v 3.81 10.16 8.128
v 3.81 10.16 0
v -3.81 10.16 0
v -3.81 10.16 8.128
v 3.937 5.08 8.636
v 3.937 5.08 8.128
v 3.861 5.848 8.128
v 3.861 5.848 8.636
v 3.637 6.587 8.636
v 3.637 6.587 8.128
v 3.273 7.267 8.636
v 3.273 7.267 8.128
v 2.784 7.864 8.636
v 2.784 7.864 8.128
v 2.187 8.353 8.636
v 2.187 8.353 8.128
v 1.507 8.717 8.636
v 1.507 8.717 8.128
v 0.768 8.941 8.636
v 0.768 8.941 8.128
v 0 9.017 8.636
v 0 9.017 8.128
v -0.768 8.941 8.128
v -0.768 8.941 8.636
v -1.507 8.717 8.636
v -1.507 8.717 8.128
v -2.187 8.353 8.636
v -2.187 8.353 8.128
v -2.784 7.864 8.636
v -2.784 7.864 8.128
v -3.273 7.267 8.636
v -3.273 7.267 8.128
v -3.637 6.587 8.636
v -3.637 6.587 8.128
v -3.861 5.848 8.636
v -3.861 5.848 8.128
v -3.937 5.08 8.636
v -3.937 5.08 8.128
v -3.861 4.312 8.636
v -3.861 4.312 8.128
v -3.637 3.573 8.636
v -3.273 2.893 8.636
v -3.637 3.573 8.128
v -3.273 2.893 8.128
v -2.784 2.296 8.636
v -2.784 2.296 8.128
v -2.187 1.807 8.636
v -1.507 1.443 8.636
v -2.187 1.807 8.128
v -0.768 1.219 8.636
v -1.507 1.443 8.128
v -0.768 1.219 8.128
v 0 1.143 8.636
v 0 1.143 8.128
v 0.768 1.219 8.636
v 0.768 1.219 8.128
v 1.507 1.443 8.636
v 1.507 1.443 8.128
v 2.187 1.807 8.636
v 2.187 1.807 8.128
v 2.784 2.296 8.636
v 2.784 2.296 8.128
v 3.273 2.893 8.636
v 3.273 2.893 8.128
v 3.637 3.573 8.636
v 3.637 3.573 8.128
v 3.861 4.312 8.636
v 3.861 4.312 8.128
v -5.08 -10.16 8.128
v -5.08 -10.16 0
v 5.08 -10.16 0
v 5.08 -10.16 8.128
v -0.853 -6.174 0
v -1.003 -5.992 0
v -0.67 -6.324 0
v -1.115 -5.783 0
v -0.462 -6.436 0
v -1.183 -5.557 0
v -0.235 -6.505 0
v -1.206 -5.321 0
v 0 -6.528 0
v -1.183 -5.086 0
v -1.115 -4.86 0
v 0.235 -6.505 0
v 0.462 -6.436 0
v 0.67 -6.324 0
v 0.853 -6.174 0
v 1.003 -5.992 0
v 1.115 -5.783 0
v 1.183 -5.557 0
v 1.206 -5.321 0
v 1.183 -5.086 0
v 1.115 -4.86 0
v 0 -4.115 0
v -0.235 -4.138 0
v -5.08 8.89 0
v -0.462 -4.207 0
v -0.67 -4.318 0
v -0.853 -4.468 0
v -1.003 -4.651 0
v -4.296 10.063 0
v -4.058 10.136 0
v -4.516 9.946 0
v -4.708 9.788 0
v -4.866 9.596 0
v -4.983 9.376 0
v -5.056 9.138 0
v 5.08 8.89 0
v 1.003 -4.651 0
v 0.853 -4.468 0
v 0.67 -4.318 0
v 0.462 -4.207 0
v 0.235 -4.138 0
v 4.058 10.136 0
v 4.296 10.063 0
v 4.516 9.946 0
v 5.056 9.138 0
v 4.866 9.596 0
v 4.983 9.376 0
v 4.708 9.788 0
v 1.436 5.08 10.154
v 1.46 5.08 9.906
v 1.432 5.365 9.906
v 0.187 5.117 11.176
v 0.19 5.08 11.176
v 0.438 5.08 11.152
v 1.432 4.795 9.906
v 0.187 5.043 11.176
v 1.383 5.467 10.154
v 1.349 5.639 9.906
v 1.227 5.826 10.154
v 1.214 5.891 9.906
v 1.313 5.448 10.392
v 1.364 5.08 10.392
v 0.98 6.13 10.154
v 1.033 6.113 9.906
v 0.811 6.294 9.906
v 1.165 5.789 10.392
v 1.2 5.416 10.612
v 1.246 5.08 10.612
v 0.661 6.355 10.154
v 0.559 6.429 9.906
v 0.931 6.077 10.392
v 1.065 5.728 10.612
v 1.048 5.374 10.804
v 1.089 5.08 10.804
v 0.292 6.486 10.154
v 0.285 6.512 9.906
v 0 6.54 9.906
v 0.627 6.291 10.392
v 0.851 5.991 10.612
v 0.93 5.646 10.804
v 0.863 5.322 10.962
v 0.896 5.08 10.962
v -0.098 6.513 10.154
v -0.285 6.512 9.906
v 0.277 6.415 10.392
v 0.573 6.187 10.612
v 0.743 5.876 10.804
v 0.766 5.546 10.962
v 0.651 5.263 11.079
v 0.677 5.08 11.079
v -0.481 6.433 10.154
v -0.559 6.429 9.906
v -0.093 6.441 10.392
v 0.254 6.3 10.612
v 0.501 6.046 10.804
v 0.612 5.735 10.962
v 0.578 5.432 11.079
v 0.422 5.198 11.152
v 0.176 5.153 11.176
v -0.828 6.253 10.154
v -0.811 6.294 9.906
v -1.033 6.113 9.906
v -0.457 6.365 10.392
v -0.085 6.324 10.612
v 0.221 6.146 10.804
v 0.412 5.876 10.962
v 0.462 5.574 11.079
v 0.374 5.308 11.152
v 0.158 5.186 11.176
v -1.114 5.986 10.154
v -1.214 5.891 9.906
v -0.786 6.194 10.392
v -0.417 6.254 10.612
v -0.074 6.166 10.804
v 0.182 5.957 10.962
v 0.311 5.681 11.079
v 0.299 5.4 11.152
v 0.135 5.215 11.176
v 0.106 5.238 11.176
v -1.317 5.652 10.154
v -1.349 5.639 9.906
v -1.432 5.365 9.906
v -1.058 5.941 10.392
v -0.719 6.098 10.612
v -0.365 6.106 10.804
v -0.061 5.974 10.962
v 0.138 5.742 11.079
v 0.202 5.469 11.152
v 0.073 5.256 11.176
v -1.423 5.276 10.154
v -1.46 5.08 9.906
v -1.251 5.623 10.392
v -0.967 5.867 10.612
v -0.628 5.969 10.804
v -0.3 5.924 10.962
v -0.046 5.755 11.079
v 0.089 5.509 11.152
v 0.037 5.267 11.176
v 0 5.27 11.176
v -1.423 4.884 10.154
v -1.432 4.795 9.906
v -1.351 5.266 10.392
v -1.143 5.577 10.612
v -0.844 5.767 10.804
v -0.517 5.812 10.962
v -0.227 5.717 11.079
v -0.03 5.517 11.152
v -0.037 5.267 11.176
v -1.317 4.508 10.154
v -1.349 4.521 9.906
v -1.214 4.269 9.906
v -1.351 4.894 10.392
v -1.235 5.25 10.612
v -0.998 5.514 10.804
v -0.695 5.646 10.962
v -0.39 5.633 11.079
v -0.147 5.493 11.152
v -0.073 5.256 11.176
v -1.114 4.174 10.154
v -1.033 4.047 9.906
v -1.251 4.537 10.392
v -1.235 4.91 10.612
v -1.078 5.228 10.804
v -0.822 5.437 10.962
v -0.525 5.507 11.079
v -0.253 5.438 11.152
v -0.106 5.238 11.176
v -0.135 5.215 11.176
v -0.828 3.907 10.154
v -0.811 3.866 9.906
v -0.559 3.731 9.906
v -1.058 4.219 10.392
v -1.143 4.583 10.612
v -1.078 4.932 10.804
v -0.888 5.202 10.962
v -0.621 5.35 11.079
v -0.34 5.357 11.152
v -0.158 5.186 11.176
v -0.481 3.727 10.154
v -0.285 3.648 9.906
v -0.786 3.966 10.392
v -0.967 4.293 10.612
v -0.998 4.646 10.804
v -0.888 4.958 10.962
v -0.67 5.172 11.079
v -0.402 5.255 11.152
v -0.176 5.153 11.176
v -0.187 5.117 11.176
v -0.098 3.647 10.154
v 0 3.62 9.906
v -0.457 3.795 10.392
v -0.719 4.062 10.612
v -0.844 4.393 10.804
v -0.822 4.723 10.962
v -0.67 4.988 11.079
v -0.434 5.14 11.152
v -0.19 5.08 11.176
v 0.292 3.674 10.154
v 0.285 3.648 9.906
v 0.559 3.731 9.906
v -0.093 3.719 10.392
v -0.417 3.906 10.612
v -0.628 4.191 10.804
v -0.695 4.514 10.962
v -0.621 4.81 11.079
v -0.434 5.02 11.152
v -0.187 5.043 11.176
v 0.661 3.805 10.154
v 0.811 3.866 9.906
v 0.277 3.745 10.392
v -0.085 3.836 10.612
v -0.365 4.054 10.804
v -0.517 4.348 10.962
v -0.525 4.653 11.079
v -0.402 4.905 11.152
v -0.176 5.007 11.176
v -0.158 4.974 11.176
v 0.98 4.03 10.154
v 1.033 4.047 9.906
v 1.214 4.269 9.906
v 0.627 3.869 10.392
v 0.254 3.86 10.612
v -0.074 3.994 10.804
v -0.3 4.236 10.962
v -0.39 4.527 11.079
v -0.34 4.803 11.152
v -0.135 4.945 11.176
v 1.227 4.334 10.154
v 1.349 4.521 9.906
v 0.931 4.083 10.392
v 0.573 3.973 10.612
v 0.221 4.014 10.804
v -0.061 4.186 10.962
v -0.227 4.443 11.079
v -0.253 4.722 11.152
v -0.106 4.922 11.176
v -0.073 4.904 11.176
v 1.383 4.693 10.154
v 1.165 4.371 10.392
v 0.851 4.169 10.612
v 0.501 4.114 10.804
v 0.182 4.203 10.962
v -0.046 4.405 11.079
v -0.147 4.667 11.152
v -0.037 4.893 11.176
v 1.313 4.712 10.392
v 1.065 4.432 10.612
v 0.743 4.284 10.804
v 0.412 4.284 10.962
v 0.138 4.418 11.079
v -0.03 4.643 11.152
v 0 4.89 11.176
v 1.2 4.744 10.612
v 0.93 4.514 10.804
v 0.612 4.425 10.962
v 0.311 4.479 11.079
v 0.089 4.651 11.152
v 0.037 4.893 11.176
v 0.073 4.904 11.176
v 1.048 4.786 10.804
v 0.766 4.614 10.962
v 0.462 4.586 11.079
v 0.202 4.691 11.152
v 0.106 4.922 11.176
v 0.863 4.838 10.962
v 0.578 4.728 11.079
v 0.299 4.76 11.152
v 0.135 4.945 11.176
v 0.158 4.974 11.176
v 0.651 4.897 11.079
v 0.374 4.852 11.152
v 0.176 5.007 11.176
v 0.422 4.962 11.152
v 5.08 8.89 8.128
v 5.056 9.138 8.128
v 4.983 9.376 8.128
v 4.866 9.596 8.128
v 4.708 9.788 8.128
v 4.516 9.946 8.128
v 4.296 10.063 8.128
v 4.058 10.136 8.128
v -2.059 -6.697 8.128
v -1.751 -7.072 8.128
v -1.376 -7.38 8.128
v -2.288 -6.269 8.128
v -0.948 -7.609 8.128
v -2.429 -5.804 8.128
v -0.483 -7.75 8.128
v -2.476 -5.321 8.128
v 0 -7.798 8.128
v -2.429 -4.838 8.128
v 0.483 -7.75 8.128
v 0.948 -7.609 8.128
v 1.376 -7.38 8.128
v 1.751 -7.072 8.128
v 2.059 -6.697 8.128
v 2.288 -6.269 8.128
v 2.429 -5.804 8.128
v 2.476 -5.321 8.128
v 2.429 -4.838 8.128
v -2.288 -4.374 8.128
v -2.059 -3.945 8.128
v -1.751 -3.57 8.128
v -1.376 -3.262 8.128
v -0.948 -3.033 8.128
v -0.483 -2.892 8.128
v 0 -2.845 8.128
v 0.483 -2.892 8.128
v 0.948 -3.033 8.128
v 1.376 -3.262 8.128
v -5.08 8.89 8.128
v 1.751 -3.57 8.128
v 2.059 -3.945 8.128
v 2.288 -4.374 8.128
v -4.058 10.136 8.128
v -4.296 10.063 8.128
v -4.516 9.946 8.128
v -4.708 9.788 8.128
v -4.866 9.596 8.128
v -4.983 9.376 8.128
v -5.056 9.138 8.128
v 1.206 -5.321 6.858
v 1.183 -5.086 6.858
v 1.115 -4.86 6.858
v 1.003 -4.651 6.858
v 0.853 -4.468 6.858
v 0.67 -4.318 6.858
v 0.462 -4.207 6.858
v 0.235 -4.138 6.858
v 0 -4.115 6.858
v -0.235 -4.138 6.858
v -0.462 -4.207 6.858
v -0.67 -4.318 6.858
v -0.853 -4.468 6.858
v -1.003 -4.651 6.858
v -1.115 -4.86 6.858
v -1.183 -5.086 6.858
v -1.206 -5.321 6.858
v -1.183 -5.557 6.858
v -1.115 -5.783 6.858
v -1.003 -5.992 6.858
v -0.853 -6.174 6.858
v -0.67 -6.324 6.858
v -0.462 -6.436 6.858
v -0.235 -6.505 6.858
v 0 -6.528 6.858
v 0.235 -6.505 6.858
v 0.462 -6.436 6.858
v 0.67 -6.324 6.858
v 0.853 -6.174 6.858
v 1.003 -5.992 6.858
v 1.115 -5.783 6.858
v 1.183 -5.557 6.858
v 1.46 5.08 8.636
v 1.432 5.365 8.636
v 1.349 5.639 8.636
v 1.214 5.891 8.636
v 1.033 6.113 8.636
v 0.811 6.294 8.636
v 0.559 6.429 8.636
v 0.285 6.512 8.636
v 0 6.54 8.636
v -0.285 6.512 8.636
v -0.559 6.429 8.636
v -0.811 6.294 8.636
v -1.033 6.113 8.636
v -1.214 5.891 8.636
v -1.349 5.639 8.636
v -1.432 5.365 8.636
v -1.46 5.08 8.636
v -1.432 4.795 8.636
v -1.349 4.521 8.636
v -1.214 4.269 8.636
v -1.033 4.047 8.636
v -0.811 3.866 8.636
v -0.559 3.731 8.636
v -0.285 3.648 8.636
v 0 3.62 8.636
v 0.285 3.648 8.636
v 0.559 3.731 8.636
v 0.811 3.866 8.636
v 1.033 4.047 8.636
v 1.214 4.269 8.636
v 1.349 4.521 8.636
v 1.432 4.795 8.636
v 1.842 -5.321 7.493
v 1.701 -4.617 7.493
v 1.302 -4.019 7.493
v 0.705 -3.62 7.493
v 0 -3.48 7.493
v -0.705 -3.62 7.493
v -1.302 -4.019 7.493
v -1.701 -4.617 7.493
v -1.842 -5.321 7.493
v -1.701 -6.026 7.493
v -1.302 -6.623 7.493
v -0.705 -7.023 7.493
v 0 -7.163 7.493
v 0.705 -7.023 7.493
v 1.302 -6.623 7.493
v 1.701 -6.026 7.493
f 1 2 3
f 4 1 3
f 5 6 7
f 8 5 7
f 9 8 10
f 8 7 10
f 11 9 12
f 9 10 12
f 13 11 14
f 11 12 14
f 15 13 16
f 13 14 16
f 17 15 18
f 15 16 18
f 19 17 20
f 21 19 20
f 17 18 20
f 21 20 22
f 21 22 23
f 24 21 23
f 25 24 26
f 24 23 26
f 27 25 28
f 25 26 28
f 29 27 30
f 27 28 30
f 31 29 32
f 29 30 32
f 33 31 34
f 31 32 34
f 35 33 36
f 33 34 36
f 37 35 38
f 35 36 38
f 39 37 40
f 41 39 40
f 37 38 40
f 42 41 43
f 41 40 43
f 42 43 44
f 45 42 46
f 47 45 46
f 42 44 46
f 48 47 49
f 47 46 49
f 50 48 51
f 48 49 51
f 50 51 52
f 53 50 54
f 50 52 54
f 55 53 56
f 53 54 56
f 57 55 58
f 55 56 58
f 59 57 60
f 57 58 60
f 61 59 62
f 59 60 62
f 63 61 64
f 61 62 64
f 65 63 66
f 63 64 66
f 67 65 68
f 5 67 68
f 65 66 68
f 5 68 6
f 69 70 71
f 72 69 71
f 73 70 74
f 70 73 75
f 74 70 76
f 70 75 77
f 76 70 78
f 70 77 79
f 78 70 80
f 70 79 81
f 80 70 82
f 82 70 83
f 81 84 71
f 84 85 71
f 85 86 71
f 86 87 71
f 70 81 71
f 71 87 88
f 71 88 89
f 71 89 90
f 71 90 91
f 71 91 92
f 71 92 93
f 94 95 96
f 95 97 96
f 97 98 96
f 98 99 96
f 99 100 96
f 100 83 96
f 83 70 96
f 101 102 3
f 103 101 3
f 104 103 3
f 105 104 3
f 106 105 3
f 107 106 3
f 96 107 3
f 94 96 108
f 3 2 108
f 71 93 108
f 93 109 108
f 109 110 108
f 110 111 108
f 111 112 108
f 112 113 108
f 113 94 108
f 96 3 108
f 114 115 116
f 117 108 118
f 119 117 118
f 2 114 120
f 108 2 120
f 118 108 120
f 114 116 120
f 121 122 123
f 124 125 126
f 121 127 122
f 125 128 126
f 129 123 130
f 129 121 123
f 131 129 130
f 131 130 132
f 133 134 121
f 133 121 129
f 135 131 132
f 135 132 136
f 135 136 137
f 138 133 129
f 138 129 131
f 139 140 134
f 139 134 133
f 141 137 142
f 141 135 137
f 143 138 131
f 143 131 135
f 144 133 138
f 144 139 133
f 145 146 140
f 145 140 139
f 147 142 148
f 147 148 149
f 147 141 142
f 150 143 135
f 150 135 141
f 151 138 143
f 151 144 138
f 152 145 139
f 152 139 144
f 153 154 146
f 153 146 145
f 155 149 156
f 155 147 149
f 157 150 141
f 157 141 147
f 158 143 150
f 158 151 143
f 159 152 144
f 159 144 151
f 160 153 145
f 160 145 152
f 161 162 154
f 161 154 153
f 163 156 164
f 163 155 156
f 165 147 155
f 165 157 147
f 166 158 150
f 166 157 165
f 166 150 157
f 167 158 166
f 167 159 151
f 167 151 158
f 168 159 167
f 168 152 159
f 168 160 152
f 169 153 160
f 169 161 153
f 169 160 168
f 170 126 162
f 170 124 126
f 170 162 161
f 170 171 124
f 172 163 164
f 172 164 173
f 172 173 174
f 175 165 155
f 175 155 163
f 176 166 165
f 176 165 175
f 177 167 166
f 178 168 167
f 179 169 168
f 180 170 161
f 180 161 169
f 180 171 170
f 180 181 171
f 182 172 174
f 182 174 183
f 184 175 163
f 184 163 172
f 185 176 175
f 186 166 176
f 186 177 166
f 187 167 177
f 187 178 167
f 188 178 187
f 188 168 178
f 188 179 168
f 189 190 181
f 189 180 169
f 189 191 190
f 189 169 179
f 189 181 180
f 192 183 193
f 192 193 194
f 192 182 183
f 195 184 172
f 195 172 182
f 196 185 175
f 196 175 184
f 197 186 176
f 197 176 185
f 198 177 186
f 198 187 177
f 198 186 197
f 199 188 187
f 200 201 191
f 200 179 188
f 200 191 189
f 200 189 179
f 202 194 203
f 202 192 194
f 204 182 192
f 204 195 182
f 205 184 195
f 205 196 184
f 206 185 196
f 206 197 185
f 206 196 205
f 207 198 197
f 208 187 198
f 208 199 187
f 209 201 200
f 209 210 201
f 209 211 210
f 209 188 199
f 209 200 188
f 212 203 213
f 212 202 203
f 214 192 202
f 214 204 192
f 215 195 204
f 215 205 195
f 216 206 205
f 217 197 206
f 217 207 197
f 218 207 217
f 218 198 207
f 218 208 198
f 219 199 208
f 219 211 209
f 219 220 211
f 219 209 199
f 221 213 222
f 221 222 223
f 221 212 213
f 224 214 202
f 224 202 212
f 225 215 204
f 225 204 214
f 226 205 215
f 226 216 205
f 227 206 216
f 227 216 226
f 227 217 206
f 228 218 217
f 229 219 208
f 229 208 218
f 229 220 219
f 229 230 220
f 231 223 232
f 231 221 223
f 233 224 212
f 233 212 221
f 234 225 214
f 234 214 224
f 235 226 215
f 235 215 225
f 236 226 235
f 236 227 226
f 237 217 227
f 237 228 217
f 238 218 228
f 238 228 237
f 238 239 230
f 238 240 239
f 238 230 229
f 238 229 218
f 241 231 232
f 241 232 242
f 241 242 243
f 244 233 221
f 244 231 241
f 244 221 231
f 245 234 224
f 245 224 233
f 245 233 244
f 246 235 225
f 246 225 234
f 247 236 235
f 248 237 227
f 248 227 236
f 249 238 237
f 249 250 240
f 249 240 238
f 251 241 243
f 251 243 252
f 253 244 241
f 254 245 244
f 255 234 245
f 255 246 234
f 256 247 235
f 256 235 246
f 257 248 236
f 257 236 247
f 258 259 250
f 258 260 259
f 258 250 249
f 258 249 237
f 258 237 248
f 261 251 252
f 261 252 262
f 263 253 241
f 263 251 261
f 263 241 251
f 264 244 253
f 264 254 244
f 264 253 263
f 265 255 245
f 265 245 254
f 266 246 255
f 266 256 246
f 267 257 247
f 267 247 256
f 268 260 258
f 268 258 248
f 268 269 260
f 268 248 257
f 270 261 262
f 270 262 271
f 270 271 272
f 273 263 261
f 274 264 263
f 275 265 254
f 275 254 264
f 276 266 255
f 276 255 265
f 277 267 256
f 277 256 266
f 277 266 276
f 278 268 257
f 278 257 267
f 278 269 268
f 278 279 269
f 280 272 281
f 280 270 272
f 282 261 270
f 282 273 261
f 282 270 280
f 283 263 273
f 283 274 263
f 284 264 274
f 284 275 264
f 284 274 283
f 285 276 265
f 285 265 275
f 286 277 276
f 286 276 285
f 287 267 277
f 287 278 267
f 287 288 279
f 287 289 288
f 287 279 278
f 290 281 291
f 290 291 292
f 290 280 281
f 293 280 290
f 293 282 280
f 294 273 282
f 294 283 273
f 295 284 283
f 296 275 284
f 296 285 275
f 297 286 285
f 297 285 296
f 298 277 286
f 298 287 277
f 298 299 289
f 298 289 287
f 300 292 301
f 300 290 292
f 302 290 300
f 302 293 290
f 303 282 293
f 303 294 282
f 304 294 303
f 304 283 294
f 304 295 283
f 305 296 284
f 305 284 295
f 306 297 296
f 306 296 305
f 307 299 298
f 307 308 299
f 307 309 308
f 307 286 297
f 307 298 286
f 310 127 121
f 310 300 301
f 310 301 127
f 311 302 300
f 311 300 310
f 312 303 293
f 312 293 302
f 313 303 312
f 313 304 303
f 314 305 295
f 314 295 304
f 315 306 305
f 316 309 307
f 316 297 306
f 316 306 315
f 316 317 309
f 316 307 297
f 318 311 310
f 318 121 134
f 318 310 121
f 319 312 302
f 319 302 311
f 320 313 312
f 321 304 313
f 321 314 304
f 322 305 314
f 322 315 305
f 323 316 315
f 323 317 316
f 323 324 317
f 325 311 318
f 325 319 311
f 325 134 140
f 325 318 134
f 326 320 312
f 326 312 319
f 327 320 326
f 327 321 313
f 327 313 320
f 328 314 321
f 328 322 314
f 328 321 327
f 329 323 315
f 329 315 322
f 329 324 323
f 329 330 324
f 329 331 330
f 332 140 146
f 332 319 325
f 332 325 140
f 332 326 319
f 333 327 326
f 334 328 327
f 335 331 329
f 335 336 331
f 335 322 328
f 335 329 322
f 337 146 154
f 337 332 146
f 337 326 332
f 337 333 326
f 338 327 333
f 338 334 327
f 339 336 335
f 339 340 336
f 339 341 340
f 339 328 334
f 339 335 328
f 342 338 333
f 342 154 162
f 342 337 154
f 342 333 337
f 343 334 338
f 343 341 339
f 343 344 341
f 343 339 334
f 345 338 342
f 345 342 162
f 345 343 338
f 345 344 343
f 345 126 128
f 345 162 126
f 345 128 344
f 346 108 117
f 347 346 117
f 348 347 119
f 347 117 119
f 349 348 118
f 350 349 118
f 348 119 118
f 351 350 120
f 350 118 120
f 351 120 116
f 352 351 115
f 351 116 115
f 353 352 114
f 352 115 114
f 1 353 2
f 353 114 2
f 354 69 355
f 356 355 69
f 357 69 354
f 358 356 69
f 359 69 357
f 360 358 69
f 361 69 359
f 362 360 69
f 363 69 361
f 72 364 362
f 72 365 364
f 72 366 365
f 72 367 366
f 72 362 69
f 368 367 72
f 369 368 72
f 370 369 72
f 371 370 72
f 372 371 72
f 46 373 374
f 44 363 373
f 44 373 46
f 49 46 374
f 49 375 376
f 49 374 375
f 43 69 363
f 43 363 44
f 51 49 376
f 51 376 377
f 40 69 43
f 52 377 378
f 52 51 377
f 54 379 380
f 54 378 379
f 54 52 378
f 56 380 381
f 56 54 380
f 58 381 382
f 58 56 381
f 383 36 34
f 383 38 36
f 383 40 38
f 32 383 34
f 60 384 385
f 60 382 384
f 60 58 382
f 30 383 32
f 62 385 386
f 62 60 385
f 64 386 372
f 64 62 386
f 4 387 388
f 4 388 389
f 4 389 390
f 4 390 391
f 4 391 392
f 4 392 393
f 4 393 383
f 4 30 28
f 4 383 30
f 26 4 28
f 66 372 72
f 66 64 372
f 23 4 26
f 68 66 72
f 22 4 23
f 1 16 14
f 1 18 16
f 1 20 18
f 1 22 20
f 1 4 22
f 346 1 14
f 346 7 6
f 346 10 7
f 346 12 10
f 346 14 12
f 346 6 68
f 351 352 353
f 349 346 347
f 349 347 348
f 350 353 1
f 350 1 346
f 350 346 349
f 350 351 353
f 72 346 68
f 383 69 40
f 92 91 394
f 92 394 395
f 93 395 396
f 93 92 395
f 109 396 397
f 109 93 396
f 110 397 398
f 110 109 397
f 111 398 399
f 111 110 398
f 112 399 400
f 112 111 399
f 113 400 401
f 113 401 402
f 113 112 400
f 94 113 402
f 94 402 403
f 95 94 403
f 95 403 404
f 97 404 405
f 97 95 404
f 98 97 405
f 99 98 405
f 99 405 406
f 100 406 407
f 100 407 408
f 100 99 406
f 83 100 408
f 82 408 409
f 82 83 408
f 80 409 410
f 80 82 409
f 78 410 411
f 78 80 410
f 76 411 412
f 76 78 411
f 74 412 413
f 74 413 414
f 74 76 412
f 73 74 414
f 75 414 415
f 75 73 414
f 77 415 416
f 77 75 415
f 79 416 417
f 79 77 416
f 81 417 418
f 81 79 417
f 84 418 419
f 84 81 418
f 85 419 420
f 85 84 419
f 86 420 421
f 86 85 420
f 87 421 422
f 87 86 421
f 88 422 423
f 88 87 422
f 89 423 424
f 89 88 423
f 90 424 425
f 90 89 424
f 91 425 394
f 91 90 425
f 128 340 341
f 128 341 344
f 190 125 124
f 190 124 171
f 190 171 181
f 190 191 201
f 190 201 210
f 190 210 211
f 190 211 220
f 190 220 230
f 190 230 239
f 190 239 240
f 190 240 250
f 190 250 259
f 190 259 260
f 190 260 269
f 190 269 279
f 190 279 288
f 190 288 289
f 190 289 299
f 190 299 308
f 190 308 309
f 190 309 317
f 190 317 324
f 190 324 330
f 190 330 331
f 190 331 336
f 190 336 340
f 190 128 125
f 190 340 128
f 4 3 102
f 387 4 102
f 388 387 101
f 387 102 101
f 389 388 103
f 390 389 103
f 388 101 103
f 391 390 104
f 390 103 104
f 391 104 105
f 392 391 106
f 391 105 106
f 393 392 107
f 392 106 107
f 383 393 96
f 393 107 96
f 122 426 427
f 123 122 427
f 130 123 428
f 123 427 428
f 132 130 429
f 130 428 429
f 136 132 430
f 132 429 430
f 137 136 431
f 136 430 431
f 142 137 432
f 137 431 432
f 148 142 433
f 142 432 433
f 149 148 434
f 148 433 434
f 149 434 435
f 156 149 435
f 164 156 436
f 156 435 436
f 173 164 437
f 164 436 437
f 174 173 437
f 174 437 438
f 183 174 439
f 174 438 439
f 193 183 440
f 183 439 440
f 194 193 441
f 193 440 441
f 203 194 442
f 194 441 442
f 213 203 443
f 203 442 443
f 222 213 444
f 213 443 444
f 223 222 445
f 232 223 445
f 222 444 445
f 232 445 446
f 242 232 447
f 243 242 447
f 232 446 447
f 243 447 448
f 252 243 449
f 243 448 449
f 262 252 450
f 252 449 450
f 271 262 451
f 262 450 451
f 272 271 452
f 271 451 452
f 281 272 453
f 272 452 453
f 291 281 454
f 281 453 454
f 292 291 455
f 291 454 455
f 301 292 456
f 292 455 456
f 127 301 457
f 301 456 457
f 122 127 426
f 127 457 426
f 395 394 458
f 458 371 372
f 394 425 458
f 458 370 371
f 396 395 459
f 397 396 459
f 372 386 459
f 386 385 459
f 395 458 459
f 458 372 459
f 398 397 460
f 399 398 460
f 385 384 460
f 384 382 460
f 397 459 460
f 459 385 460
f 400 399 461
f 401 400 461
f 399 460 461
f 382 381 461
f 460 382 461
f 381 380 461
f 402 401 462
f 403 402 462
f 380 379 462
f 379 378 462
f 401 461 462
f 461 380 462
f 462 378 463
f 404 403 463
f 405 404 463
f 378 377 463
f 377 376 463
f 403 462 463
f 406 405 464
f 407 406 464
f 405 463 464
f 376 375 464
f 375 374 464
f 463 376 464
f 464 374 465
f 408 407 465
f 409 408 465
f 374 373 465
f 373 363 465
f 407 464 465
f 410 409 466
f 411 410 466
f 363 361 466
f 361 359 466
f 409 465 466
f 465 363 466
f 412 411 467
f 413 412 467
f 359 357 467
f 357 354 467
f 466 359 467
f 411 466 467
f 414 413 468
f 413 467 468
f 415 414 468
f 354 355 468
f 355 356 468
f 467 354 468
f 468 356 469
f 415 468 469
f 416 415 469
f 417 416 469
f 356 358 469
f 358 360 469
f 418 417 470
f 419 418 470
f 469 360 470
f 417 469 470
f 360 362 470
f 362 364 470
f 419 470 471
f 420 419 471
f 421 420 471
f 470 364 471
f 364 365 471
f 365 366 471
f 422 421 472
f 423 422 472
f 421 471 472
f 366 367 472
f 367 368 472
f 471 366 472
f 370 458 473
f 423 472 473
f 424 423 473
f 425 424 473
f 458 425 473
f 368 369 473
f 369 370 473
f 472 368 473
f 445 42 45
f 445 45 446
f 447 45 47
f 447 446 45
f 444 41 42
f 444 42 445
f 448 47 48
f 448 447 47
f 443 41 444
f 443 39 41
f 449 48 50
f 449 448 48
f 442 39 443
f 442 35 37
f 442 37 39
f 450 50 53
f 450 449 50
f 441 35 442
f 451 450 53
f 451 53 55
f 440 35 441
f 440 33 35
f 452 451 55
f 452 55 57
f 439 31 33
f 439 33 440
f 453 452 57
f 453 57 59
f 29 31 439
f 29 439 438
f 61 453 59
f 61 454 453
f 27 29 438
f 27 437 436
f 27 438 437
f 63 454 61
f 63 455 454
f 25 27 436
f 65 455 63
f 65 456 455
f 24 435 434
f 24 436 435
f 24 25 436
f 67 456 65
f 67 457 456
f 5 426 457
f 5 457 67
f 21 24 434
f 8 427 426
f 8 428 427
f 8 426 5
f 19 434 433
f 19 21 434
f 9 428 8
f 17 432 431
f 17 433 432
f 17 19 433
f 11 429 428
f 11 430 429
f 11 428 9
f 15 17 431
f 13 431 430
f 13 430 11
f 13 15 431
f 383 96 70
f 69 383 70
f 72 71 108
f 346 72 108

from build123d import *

# Parameters (mm, degrees)
F0_R     = 1.2065
F1_DEPTH = 8.128
F2_SIZE  = 1.27
F3_R     = 3.937
F4_DEPTH = 0.508
F5_R     = 1.4605
F6_DEPTH = 2.54
F7_R     = 1.27


with BuildPart() as f1:
    # F0 (on Top) → F1 (new body)
    with BuildSketch(Plane.XY):
        with BuildLine():
            Line((-5.08, -10.16), (5.08, -10.16))
            Line((5.08, -10.16), (5.08, 8.89))
            ThreePointArc((5.08, 8.89), (4.708026, 9.788026), (3.81, 10.16))
            Line((3.81, 10.16), (-3.81, 10.16))
            ThreePointArc((-3.81, 10.16), (-4.708026, 9.788026), (-5.08, 8.89))
            Line((-5.08, 8.89), (-5.08, -10.16))
        make_face()
        with Locations((0, -5.3213)):
            Circle(F0_R, mode=Mode.SUBTRACT)
    extrude(amount=F1_DEPTH)

    # F2
    f2_edges = [f1.edges().sort_by_distance(p)[0] for p in [
        (-1.2065, -5.3213, 8.128),
    ]]
    chamfer(f2_edges, length=F2_SIZE)

    # F3 (on face) → F4 (join)
    with BuildSketch(Plane.XY.offset(8.128)):
        with Locations((0, 5.08)):
            Circle(F3_R)
    extrude(amount=F4_DEPTH)

    # F5 (on face) → F6 (join)
    with BuildSketch(Plane.XY.offset(8.636)):
        with Locations((0, 5.08)):
            Circle(F5_R)
    extrude(amount=F6_DEPTH)

    # F7
    f7_edges = [f1.edges().sort_by_distance(p)[0] for p in [
        (-1.4605, 5.08, 11.176),
    ]]
    fillet(f7_edges, radius=F7_R)


solid = f1.part
